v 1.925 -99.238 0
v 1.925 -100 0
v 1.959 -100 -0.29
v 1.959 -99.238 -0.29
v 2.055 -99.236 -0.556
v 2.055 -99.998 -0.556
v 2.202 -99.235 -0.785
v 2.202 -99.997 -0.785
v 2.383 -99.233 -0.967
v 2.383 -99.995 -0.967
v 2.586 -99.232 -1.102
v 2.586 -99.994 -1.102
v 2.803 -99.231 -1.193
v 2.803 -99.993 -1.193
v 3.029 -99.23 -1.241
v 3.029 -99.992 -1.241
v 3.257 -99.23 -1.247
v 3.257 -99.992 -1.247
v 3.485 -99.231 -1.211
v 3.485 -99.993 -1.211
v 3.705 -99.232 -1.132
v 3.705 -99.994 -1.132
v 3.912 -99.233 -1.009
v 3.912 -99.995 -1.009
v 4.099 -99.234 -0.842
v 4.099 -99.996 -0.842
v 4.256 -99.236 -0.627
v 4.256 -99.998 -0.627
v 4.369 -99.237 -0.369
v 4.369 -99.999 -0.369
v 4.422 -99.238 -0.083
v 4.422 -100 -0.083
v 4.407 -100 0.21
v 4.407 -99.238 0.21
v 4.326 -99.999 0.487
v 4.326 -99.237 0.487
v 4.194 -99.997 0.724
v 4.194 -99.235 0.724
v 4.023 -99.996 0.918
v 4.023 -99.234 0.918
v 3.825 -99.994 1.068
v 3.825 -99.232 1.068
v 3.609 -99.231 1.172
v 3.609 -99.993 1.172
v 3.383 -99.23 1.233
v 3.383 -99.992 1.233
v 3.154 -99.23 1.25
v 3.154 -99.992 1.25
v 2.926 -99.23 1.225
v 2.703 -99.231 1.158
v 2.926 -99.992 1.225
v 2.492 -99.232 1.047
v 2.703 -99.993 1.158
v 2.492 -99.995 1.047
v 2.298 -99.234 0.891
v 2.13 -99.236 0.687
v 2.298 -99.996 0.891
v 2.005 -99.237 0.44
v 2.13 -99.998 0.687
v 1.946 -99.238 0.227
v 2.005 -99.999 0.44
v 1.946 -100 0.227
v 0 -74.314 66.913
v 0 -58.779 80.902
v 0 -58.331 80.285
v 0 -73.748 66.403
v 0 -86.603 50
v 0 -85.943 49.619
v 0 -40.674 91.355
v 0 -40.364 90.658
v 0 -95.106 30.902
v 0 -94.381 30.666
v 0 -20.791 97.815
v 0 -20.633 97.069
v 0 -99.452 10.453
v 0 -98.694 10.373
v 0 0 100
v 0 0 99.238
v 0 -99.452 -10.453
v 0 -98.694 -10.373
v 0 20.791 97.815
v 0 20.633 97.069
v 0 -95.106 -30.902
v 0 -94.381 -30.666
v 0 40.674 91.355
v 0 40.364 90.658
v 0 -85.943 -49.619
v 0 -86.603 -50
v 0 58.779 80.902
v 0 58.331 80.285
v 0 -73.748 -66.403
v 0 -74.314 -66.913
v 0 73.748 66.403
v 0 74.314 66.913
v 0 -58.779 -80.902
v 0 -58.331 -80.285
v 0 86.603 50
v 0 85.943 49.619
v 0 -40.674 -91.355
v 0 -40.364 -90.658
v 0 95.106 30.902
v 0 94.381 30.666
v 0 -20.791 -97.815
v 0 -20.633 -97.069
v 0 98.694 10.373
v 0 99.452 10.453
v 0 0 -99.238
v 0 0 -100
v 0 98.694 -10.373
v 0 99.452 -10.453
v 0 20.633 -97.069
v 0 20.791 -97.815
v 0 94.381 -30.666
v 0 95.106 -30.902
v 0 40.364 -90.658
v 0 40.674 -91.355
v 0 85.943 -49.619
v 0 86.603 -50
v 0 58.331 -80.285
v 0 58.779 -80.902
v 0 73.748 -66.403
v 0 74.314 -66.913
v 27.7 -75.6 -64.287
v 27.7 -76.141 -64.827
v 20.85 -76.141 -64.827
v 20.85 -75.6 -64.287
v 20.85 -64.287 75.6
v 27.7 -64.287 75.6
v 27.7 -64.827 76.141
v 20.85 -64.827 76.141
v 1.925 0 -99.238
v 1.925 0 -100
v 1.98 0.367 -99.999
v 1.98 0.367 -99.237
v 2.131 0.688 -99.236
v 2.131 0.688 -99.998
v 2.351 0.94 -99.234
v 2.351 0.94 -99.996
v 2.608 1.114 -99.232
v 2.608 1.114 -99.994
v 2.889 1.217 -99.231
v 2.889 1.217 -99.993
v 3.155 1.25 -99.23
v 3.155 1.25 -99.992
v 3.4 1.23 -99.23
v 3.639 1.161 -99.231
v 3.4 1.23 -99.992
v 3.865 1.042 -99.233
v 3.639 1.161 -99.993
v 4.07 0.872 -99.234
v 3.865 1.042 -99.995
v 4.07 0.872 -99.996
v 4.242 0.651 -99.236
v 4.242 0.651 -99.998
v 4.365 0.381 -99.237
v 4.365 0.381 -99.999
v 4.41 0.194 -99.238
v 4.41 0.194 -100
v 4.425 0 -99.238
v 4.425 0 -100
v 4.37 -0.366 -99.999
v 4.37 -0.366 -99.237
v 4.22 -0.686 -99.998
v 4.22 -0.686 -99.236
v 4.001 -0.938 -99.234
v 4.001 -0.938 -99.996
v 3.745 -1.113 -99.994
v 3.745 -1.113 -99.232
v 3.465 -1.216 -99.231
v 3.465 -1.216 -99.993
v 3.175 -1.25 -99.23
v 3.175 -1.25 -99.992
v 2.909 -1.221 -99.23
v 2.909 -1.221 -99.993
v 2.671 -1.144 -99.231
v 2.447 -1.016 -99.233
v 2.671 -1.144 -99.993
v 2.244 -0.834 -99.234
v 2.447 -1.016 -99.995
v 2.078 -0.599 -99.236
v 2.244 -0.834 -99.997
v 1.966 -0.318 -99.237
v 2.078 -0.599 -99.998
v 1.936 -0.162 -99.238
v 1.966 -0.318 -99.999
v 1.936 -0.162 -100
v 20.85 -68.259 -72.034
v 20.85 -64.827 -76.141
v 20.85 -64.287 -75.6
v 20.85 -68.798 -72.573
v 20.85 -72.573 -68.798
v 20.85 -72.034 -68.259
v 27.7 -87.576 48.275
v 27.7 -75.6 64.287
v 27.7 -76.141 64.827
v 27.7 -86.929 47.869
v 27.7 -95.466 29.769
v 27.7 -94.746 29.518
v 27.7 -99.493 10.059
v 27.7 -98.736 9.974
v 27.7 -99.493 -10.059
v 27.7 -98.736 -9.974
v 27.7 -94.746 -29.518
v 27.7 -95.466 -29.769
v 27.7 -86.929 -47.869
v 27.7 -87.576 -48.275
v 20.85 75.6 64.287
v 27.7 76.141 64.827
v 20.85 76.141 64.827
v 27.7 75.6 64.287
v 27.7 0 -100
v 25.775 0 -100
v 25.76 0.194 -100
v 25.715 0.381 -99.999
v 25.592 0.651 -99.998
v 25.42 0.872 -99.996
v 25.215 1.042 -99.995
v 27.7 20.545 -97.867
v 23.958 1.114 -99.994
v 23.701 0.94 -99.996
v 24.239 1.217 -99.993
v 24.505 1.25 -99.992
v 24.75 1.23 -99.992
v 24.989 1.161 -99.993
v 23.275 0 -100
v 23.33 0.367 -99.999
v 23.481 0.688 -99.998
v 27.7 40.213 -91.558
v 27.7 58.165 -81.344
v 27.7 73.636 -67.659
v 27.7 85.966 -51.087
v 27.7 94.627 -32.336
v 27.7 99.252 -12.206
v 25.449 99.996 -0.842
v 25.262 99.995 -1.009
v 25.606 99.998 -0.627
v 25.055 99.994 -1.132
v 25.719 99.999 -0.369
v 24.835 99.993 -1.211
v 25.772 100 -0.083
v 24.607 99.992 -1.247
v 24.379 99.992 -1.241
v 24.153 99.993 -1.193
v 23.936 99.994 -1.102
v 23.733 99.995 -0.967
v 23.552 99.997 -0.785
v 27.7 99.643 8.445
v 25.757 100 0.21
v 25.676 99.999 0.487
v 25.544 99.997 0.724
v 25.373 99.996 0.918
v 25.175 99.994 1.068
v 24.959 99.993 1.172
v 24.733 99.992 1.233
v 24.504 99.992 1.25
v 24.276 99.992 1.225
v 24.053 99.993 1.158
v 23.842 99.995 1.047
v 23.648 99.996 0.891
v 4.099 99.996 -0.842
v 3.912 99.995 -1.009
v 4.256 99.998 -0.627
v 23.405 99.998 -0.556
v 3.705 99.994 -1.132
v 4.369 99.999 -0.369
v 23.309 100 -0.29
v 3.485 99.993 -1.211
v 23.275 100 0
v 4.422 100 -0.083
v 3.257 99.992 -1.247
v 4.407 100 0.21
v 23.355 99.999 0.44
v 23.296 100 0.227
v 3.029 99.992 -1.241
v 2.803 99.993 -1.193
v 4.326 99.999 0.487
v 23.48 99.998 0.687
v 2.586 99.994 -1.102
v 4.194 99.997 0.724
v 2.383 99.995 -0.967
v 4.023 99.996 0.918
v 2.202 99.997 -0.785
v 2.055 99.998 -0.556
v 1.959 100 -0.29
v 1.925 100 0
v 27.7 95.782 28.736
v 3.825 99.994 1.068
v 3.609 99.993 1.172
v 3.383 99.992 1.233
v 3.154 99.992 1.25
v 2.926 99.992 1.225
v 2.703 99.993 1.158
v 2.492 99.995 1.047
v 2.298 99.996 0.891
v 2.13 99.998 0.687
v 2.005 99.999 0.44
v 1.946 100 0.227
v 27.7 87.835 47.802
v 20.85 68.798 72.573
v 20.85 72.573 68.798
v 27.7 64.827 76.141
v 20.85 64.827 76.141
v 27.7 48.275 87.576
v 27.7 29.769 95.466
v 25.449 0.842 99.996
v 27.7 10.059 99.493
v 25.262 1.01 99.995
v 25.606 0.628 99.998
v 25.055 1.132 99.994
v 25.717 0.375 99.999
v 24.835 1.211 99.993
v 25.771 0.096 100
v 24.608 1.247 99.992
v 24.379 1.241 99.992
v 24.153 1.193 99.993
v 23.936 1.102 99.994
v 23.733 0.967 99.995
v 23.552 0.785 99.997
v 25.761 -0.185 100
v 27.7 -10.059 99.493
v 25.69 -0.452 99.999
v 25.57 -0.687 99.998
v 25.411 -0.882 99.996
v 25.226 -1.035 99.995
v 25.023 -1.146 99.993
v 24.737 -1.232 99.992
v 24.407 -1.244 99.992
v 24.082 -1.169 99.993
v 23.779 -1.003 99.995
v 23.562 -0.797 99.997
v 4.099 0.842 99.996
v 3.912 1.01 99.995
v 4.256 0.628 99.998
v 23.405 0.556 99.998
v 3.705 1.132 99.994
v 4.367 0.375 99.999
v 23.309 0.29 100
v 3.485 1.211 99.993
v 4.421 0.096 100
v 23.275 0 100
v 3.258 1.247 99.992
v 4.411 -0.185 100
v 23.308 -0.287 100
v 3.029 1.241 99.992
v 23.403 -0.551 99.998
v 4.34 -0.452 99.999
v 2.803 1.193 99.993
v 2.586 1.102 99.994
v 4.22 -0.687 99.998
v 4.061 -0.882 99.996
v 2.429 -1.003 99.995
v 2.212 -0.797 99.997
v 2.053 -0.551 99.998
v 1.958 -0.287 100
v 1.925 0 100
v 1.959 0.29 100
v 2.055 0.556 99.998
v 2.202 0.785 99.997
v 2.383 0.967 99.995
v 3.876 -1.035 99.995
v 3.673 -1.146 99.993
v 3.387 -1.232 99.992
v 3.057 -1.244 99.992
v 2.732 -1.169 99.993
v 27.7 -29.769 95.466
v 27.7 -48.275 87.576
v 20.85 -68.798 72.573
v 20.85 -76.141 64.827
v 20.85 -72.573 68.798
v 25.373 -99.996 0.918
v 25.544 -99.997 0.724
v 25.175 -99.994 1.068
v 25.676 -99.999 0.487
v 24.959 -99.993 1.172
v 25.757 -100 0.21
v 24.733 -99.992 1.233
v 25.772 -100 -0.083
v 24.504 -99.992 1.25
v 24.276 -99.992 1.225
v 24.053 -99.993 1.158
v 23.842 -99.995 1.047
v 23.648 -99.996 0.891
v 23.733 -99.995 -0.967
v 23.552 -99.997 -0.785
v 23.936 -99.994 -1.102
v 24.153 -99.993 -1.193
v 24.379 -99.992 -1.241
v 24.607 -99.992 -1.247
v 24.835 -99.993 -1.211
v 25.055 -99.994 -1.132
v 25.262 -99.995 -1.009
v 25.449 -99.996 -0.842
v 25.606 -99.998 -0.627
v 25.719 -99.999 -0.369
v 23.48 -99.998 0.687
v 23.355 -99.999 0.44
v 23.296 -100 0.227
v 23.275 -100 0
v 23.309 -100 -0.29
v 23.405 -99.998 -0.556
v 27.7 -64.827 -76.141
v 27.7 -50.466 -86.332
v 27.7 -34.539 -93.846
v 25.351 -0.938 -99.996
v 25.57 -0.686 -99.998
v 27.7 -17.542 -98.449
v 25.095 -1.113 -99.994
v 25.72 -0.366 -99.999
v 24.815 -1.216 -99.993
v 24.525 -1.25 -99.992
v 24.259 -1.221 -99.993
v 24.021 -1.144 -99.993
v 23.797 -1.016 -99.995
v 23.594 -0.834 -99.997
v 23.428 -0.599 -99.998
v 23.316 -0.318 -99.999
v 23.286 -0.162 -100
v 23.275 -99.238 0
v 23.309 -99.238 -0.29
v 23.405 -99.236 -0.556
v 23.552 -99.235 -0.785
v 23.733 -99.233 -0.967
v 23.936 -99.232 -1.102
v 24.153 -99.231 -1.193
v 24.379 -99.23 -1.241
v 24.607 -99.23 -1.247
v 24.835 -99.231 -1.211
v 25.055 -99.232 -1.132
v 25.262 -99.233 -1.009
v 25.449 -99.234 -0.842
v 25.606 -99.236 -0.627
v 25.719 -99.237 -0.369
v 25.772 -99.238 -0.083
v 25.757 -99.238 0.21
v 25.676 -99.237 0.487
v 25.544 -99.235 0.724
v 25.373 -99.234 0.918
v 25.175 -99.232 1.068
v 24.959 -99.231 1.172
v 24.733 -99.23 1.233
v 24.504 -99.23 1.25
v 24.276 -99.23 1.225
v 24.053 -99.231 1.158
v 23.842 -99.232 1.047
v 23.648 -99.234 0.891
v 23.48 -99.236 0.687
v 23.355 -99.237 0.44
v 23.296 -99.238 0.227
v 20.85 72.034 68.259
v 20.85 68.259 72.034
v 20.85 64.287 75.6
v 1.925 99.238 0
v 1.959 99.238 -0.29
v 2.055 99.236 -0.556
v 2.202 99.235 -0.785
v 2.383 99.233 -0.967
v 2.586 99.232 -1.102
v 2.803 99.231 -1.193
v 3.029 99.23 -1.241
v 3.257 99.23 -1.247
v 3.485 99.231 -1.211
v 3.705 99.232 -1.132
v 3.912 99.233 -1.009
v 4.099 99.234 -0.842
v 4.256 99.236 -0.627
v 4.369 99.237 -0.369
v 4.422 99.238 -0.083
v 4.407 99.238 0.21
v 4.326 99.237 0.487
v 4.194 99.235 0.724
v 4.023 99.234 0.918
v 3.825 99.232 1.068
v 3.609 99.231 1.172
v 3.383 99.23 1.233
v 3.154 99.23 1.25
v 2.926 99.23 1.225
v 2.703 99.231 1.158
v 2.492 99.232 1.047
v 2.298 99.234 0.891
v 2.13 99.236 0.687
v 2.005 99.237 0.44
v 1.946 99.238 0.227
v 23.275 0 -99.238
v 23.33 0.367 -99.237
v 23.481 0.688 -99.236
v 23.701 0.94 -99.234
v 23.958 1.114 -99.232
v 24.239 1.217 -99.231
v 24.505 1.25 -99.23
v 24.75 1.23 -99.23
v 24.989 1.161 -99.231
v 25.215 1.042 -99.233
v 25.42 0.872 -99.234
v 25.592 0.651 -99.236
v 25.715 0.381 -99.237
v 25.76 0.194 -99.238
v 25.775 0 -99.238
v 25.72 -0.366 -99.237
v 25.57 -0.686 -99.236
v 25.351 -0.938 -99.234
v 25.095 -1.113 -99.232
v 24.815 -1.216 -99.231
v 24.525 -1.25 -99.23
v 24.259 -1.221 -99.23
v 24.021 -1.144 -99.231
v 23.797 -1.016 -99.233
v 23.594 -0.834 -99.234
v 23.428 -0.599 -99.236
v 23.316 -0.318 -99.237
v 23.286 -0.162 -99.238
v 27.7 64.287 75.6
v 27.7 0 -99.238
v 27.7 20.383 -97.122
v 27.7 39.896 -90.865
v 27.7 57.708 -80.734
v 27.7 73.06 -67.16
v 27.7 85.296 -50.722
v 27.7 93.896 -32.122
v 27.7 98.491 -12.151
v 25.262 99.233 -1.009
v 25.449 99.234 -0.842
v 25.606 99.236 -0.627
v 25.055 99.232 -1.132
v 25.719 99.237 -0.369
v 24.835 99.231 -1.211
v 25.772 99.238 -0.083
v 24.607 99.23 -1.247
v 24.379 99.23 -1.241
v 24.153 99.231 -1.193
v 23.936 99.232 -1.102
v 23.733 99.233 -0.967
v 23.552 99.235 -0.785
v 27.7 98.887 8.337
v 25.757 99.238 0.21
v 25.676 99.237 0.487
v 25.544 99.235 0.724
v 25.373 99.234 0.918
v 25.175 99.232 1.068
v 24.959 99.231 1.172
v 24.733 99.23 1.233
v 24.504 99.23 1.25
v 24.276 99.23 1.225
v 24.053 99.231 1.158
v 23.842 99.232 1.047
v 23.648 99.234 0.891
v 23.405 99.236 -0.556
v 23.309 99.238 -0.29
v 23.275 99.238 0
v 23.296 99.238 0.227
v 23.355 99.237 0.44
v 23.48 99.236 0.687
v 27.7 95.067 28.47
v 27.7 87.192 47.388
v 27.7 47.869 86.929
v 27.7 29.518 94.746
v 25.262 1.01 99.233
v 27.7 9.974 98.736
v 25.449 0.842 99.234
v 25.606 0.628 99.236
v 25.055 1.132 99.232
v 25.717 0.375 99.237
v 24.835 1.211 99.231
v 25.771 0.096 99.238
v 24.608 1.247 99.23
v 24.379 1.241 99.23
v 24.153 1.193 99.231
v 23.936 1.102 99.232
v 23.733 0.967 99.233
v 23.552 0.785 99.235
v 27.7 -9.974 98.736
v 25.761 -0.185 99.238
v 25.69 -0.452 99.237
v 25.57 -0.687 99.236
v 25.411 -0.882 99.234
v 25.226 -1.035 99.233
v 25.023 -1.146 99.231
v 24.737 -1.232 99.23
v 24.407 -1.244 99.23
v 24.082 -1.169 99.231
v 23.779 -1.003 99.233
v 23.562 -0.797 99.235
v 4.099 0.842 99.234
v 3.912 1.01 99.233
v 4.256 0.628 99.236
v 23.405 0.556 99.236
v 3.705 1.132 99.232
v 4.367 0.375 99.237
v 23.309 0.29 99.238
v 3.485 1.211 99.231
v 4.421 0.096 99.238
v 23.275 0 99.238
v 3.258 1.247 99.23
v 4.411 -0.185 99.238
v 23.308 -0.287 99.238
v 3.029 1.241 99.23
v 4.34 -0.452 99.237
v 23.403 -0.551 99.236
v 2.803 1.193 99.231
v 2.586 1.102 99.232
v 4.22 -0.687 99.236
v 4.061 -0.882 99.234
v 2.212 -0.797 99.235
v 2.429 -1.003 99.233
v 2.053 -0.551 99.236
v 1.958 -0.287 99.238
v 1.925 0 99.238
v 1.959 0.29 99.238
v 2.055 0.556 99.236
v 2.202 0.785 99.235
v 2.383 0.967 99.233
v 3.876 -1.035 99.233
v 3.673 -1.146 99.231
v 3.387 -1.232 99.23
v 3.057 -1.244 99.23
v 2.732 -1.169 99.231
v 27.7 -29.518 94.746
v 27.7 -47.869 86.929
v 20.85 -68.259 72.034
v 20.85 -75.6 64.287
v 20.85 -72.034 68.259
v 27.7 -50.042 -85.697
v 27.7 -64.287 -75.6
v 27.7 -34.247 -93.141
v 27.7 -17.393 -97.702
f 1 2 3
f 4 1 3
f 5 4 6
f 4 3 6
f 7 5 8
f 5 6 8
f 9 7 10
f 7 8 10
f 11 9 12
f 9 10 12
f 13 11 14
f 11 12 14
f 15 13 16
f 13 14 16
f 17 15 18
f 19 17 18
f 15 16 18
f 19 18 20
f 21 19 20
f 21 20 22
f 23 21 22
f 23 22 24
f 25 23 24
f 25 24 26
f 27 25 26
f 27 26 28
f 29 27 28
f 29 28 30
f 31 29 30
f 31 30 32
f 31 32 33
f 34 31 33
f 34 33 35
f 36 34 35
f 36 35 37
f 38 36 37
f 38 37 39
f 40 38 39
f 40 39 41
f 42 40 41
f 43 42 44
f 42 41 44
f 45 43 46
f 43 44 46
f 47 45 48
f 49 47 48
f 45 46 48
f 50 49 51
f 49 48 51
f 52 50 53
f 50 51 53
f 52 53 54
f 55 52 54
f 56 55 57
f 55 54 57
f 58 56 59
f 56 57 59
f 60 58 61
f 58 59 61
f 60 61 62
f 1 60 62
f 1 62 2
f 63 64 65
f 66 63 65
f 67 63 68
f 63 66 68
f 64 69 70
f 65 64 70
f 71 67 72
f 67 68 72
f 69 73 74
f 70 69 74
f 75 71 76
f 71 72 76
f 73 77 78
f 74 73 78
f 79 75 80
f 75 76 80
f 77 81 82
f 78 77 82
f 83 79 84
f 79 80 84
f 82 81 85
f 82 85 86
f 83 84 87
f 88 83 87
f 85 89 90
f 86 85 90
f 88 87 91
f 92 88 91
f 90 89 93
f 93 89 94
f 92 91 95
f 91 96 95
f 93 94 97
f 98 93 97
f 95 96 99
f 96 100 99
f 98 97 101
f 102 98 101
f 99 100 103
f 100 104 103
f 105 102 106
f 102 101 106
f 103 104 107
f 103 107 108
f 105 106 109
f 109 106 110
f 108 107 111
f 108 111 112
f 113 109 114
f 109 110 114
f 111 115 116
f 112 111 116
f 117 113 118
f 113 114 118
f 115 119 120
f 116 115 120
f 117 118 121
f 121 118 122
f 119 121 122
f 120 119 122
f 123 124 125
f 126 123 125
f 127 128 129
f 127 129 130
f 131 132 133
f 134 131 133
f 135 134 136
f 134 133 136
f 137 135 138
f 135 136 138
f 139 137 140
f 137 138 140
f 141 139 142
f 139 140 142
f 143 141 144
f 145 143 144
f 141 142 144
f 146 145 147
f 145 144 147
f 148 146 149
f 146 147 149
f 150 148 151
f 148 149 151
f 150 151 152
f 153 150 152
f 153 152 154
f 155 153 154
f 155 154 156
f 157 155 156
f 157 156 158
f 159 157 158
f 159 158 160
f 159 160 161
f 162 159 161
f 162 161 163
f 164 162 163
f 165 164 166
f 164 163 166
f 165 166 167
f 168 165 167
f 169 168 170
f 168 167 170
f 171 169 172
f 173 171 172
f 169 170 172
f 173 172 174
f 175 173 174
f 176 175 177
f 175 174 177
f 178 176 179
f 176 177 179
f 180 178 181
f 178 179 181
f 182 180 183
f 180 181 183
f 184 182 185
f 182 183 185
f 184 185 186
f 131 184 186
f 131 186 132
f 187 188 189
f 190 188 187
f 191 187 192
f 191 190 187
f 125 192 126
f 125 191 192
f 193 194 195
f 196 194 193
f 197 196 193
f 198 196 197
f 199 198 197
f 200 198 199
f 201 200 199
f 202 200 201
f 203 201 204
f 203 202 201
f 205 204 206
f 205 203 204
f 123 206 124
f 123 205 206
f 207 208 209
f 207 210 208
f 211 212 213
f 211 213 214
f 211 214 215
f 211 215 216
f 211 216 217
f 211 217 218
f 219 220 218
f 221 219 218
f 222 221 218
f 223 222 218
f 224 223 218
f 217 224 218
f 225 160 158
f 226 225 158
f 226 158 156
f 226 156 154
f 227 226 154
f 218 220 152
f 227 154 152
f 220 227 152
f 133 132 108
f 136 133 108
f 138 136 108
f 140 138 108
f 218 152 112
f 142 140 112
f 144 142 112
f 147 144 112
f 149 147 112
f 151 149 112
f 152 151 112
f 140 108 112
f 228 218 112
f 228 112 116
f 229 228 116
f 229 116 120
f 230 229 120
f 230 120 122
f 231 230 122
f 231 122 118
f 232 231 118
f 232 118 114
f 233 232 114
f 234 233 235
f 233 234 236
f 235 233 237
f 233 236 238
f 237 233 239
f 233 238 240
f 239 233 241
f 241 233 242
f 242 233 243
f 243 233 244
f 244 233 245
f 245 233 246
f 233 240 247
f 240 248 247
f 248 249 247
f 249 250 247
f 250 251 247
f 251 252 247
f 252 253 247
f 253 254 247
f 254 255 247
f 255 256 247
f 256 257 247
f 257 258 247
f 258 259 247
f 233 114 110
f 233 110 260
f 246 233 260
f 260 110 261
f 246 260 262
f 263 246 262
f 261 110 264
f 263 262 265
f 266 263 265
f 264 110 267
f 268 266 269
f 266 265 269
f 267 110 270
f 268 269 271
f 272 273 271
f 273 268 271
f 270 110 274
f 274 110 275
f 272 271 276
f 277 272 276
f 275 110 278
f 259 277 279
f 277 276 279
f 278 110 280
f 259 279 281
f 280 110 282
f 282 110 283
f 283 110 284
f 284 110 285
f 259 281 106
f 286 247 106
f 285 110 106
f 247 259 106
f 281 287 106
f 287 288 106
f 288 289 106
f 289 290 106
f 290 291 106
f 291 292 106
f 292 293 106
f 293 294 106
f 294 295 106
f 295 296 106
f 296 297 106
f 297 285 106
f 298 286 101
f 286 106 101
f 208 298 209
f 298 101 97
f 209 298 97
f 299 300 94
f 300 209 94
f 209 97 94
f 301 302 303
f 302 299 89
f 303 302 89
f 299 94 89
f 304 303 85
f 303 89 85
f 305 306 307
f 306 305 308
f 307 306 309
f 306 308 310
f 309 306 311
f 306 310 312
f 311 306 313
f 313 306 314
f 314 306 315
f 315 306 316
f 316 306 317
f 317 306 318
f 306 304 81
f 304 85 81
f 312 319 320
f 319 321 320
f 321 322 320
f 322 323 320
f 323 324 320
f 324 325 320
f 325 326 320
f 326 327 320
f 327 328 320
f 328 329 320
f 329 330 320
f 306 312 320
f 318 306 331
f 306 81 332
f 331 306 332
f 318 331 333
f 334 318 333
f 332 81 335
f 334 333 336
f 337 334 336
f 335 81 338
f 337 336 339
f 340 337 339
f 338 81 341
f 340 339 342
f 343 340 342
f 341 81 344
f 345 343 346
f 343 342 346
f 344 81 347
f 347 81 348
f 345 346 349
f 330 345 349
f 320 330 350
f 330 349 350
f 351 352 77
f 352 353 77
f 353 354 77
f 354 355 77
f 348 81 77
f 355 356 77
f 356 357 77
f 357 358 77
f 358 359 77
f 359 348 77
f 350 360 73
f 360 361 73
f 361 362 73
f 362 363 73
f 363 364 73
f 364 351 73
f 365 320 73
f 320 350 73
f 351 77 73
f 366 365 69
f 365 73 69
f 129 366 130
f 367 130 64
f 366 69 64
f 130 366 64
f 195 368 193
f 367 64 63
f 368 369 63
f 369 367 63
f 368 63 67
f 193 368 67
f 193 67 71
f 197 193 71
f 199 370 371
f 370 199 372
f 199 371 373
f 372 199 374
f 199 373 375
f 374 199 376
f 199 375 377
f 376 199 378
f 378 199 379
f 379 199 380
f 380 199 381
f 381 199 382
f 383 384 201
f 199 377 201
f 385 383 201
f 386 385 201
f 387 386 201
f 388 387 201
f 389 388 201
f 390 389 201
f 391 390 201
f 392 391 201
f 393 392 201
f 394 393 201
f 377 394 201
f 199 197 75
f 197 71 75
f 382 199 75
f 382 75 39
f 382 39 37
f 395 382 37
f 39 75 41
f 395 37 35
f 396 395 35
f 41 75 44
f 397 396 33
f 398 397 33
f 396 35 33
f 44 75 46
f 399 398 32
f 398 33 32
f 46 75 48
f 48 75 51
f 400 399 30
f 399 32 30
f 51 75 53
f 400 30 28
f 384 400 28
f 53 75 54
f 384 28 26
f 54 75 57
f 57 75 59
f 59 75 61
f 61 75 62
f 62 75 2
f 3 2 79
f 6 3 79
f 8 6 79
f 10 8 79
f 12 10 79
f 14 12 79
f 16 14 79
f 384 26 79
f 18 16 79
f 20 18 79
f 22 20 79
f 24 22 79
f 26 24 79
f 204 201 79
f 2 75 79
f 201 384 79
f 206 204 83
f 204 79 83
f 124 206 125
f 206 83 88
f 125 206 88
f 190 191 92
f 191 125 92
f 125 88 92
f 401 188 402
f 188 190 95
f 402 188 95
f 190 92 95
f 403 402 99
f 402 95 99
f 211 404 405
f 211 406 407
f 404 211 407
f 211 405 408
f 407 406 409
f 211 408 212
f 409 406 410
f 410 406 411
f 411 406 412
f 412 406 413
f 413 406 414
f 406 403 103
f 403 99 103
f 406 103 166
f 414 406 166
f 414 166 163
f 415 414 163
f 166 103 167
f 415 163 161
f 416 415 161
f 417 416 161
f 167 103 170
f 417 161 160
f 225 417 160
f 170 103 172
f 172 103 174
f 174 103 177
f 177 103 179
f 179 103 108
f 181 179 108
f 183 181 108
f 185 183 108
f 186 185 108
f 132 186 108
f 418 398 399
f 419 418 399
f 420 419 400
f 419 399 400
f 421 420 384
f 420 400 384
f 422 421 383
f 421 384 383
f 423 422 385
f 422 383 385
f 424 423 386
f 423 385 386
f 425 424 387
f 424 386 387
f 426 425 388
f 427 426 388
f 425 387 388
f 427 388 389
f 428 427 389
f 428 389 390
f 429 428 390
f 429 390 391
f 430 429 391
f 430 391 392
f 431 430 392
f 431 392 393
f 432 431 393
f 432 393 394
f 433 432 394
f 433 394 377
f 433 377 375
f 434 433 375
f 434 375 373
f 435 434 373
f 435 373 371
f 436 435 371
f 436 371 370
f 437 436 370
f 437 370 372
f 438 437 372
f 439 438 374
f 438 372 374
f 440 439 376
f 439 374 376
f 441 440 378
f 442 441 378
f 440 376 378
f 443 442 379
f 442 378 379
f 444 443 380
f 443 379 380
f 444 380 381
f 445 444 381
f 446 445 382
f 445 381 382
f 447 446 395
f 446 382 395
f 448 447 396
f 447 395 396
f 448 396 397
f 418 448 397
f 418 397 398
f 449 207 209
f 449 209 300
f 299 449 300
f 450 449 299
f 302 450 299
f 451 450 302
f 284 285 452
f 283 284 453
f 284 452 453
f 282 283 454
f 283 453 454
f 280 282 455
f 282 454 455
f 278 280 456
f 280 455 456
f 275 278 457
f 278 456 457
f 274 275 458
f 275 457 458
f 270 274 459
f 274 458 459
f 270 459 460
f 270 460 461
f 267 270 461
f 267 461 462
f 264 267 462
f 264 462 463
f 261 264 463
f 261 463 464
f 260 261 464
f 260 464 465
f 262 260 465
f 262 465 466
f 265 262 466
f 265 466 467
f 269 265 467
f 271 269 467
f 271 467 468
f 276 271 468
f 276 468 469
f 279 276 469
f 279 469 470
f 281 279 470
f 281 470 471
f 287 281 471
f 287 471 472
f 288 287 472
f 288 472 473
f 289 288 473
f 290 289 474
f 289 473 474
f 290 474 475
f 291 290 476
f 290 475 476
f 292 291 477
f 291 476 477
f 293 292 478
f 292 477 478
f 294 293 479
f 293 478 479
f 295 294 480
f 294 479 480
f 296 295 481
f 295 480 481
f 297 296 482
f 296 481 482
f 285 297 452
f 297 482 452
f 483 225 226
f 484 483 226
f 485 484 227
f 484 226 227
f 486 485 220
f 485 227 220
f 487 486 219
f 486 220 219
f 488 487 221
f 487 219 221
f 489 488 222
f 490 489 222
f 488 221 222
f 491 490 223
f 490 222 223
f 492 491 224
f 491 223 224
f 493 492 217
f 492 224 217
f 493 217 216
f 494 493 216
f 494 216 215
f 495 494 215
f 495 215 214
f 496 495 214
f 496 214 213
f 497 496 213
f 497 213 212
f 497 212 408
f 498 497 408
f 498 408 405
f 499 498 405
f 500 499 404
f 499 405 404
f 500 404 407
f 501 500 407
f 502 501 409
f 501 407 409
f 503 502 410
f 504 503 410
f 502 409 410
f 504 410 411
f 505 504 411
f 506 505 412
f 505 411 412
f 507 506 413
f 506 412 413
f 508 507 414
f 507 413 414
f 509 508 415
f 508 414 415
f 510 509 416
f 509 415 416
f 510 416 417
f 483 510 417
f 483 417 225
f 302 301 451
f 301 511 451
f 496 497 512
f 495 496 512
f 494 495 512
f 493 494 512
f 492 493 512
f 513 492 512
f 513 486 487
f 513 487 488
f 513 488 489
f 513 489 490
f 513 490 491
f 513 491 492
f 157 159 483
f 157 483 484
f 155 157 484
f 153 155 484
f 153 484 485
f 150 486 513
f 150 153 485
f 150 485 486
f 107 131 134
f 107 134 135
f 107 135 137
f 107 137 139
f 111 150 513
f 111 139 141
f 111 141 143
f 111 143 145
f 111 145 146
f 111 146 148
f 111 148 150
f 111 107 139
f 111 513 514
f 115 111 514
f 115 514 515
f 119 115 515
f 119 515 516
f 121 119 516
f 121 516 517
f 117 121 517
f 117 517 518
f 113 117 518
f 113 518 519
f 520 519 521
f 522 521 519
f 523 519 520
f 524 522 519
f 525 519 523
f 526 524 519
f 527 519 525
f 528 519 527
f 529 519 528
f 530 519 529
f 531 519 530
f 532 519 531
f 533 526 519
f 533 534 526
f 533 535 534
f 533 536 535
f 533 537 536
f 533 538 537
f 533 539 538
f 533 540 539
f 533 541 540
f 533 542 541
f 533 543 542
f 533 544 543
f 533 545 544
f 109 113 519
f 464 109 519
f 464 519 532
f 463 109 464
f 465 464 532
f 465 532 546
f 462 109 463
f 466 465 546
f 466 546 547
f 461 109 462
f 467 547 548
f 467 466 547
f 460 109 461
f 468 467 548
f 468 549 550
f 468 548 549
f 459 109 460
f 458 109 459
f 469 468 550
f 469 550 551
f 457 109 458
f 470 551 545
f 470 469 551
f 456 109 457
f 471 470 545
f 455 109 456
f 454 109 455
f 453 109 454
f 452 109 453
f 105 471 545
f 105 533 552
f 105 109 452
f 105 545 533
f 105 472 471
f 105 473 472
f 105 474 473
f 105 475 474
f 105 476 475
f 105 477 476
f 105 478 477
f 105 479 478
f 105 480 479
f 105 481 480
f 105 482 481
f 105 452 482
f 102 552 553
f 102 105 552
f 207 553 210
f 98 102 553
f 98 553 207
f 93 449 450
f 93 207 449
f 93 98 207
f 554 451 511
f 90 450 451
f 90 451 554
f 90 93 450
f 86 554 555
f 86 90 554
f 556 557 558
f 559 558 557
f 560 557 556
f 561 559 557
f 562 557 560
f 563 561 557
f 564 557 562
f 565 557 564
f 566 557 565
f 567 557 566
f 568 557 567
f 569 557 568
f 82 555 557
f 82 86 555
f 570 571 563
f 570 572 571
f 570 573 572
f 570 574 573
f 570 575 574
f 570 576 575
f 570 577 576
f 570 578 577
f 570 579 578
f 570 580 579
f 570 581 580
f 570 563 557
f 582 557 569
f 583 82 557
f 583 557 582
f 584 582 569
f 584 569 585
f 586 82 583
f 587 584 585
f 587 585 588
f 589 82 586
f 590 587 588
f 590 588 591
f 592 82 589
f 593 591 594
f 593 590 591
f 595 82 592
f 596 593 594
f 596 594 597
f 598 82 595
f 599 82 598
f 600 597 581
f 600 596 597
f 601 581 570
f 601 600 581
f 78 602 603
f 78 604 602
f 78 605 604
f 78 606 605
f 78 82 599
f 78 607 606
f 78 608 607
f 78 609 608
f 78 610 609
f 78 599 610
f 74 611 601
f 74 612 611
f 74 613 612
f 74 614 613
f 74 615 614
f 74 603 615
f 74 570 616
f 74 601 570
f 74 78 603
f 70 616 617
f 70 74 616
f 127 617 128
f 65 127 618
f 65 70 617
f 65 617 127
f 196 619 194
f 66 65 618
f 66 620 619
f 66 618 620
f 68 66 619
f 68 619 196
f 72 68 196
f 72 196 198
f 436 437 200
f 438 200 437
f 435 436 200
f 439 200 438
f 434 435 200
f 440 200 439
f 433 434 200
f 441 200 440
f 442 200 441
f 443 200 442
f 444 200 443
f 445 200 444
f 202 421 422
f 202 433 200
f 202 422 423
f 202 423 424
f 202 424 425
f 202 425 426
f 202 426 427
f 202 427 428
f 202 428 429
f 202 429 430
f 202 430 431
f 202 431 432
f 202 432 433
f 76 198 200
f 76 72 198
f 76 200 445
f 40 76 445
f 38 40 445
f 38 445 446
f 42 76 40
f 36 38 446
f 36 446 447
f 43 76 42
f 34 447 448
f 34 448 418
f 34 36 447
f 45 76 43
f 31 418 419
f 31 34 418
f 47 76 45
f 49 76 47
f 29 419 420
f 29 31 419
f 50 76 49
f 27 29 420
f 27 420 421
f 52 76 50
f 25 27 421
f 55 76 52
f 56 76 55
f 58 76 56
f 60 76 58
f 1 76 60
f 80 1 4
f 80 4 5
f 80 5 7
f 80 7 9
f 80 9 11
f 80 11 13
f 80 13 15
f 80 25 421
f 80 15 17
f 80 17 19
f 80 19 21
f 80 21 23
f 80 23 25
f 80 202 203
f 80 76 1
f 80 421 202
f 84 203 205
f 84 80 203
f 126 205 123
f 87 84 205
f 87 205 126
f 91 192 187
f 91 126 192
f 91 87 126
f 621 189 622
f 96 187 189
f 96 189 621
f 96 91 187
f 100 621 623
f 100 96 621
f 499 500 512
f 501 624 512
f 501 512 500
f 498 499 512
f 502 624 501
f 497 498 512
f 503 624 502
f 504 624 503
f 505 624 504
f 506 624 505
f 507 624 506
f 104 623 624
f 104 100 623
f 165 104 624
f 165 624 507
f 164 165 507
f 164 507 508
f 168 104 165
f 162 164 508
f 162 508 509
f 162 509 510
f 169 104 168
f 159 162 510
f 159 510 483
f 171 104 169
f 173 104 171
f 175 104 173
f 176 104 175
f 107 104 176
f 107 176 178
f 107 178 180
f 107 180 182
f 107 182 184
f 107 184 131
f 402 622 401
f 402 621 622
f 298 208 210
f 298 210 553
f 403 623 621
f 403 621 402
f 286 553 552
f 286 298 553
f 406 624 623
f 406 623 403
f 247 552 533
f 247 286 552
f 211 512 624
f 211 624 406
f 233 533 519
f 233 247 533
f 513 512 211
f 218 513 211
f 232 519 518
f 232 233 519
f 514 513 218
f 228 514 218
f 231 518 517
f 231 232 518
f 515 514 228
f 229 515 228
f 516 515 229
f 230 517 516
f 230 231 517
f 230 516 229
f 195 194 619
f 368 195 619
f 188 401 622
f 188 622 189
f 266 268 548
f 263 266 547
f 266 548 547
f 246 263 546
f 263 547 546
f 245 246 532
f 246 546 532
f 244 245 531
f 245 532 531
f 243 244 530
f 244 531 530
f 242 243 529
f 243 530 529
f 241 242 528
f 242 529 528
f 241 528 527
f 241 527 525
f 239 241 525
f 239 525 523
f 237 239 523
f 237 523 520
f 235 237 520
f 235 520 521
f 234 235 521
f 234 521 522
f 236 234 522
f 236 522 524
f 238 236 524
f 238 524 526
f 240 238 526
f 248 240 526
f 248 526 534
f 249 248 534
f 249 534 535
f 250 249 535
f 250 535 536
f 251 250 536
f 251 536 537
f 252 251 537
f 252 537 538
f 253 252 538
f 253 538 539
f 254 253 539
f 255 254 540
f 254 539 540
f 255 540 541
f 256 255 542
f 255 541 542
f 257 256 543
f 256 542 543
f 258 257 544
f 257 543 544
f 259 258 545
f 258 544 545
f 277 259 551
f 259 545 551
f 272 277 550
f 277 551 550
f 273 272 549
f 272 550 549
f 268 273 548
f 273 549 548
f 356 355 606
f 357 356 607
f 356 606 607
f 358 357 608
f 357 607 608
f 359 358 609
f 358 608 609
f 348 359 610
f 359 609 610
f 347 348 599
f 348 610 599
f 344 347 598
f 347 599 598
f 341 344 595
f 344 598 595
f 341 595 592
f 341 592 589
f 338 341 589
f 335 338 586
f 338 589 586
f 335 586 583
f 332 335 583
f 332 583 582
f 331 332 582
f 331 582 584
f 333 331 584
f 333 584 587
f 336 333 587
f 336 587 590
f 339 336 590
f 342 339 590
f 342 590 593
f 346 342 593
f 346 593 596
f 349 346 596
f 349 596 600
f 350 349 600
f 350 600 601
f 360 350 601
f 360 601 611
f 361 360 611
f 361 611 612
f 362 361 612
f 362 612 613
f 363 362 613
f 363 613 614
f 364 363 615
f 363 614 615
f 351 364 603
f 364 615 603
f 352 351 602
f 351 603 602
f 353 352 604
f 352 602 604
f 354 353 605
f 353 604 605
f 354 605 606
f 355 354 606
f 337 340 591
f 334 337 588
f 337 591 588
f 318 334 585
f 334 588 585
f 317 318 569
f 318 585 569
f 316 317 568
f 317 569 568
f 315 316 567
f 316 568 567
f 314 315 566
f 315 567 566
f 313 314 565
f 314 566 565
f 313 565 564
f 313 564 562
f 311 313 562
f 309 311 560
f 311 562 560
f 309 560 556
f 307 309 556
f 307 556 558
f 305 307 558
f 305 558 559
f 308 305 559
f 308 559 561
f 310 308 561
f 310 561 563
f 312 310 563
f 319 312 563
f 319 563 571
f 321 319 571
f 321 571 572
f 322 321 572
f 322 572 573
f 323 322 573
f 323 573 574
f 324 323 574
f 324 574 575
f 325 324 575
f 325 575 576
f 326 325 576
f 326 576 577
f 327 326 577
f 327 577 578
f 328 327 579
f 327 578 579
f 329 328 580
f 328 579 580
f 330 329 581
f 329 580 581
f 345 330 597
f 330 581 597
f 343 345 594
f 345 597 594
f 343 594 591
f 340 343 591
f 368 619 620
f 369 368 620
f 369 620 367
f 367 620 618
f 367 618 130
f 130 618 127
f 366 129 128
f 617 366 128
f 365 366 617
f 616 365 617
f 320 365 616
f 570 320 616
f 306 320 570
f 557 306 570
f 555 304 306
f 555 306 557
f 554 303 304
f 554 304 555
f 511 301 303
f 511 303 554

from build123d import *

# Parameters (mm, degrees)
SKETCH1_R               = 100
SKETCH1_R_2             = 99.238
BOSS_EXTRUDE1_DEPTH     = 27.7
F_2_5MM_DOWEL_HOLE1_D   = 2.5
F_2_5MM_DOWEL_HOLE2_D   = 2.5
SKETCH6_W               = 7.35
SKETCH6_H               = 16
CUT_EXTRUDE1_DEPTH      = 145.108605038
CUT_EXTRUDE2_DEPTH      = 145.108605038
CUT_EXTRUDE2_DEPTH_BACK = 145.108605038
SKETCH7_W               = 7.35
SKETCH7_H               = 16


with BuildPart() as part:
    # Sketch1 → Boss-Extrude1 (new body)
    with BuildSketch(Plane(origin=(0, 0, 0), x_dir=(0, 0, -1), z_dir=(1, 0, 0))):
        Circle(SKETCH1_R)
        Circle(SKETCH1_R_2, mode=Mode.SUBTRACT)
    extrude(amount=BOSS_EXTRUDE1_DEPTH)

    # Ø2.5mm Dowel Hole1 (through all)
    with Locations(Plane.XY.offset(100)):
        with Locations((24.525, 0), (3.175, 0)):
            Hole(F_2_5MM_DOWEL_HOLE1_D / 2)

    # Ø2.5mm Dowel Hole2 (through all)
    with Locations(Plane(origin=(0, 100, 0), x_dir=(1, 0, 0), z_dir=(0, 1, 0))):
        with Locations((24.525, 0), (3.175, 0)):
            Hole(F_2_5MM_DOWEL_HOLE2_D / 2)

    # Sketch6 → Cut-Extrude1 (cut, through all)
    with BuildSketch(Plane(origin=(0, 0, 0), x_dir=(-1, 0, 0), z_dir=(0, 0.7071067811865475, -0.7071067811865477))):
        with Locations((-24.525, 0)):
            Rectangle(SKETCH6_W, SKETCH6_H)
    extrude(amount=-CUT_EXTRUDE1_DEPTH, mode=Mode.SUBTRACT)

    # Sketch7 → Cut-Extrude2 (cut, two sides: drawn at the far end of the back side and taken through both)
    with BuildSketch(Plane(origin=(0, 0, 0), x_dir=(-1, 0, 0), z_dir=(0, 0.7071067811865476, 0.7071067811865476)).offset(-CUT_EXTRUDE2_DEPTH_BACK)):
        with Locations((-24.525, 0)):
            Rectangle(SKETCH7_W, SKETCH7_H)
    extrude(amount=CUT_EXTRUDE2_DEPTH + CUT_EXTRUDE2_DEPTH_BACK, mode=Mode.SUBTRACT)


solid = part.part
